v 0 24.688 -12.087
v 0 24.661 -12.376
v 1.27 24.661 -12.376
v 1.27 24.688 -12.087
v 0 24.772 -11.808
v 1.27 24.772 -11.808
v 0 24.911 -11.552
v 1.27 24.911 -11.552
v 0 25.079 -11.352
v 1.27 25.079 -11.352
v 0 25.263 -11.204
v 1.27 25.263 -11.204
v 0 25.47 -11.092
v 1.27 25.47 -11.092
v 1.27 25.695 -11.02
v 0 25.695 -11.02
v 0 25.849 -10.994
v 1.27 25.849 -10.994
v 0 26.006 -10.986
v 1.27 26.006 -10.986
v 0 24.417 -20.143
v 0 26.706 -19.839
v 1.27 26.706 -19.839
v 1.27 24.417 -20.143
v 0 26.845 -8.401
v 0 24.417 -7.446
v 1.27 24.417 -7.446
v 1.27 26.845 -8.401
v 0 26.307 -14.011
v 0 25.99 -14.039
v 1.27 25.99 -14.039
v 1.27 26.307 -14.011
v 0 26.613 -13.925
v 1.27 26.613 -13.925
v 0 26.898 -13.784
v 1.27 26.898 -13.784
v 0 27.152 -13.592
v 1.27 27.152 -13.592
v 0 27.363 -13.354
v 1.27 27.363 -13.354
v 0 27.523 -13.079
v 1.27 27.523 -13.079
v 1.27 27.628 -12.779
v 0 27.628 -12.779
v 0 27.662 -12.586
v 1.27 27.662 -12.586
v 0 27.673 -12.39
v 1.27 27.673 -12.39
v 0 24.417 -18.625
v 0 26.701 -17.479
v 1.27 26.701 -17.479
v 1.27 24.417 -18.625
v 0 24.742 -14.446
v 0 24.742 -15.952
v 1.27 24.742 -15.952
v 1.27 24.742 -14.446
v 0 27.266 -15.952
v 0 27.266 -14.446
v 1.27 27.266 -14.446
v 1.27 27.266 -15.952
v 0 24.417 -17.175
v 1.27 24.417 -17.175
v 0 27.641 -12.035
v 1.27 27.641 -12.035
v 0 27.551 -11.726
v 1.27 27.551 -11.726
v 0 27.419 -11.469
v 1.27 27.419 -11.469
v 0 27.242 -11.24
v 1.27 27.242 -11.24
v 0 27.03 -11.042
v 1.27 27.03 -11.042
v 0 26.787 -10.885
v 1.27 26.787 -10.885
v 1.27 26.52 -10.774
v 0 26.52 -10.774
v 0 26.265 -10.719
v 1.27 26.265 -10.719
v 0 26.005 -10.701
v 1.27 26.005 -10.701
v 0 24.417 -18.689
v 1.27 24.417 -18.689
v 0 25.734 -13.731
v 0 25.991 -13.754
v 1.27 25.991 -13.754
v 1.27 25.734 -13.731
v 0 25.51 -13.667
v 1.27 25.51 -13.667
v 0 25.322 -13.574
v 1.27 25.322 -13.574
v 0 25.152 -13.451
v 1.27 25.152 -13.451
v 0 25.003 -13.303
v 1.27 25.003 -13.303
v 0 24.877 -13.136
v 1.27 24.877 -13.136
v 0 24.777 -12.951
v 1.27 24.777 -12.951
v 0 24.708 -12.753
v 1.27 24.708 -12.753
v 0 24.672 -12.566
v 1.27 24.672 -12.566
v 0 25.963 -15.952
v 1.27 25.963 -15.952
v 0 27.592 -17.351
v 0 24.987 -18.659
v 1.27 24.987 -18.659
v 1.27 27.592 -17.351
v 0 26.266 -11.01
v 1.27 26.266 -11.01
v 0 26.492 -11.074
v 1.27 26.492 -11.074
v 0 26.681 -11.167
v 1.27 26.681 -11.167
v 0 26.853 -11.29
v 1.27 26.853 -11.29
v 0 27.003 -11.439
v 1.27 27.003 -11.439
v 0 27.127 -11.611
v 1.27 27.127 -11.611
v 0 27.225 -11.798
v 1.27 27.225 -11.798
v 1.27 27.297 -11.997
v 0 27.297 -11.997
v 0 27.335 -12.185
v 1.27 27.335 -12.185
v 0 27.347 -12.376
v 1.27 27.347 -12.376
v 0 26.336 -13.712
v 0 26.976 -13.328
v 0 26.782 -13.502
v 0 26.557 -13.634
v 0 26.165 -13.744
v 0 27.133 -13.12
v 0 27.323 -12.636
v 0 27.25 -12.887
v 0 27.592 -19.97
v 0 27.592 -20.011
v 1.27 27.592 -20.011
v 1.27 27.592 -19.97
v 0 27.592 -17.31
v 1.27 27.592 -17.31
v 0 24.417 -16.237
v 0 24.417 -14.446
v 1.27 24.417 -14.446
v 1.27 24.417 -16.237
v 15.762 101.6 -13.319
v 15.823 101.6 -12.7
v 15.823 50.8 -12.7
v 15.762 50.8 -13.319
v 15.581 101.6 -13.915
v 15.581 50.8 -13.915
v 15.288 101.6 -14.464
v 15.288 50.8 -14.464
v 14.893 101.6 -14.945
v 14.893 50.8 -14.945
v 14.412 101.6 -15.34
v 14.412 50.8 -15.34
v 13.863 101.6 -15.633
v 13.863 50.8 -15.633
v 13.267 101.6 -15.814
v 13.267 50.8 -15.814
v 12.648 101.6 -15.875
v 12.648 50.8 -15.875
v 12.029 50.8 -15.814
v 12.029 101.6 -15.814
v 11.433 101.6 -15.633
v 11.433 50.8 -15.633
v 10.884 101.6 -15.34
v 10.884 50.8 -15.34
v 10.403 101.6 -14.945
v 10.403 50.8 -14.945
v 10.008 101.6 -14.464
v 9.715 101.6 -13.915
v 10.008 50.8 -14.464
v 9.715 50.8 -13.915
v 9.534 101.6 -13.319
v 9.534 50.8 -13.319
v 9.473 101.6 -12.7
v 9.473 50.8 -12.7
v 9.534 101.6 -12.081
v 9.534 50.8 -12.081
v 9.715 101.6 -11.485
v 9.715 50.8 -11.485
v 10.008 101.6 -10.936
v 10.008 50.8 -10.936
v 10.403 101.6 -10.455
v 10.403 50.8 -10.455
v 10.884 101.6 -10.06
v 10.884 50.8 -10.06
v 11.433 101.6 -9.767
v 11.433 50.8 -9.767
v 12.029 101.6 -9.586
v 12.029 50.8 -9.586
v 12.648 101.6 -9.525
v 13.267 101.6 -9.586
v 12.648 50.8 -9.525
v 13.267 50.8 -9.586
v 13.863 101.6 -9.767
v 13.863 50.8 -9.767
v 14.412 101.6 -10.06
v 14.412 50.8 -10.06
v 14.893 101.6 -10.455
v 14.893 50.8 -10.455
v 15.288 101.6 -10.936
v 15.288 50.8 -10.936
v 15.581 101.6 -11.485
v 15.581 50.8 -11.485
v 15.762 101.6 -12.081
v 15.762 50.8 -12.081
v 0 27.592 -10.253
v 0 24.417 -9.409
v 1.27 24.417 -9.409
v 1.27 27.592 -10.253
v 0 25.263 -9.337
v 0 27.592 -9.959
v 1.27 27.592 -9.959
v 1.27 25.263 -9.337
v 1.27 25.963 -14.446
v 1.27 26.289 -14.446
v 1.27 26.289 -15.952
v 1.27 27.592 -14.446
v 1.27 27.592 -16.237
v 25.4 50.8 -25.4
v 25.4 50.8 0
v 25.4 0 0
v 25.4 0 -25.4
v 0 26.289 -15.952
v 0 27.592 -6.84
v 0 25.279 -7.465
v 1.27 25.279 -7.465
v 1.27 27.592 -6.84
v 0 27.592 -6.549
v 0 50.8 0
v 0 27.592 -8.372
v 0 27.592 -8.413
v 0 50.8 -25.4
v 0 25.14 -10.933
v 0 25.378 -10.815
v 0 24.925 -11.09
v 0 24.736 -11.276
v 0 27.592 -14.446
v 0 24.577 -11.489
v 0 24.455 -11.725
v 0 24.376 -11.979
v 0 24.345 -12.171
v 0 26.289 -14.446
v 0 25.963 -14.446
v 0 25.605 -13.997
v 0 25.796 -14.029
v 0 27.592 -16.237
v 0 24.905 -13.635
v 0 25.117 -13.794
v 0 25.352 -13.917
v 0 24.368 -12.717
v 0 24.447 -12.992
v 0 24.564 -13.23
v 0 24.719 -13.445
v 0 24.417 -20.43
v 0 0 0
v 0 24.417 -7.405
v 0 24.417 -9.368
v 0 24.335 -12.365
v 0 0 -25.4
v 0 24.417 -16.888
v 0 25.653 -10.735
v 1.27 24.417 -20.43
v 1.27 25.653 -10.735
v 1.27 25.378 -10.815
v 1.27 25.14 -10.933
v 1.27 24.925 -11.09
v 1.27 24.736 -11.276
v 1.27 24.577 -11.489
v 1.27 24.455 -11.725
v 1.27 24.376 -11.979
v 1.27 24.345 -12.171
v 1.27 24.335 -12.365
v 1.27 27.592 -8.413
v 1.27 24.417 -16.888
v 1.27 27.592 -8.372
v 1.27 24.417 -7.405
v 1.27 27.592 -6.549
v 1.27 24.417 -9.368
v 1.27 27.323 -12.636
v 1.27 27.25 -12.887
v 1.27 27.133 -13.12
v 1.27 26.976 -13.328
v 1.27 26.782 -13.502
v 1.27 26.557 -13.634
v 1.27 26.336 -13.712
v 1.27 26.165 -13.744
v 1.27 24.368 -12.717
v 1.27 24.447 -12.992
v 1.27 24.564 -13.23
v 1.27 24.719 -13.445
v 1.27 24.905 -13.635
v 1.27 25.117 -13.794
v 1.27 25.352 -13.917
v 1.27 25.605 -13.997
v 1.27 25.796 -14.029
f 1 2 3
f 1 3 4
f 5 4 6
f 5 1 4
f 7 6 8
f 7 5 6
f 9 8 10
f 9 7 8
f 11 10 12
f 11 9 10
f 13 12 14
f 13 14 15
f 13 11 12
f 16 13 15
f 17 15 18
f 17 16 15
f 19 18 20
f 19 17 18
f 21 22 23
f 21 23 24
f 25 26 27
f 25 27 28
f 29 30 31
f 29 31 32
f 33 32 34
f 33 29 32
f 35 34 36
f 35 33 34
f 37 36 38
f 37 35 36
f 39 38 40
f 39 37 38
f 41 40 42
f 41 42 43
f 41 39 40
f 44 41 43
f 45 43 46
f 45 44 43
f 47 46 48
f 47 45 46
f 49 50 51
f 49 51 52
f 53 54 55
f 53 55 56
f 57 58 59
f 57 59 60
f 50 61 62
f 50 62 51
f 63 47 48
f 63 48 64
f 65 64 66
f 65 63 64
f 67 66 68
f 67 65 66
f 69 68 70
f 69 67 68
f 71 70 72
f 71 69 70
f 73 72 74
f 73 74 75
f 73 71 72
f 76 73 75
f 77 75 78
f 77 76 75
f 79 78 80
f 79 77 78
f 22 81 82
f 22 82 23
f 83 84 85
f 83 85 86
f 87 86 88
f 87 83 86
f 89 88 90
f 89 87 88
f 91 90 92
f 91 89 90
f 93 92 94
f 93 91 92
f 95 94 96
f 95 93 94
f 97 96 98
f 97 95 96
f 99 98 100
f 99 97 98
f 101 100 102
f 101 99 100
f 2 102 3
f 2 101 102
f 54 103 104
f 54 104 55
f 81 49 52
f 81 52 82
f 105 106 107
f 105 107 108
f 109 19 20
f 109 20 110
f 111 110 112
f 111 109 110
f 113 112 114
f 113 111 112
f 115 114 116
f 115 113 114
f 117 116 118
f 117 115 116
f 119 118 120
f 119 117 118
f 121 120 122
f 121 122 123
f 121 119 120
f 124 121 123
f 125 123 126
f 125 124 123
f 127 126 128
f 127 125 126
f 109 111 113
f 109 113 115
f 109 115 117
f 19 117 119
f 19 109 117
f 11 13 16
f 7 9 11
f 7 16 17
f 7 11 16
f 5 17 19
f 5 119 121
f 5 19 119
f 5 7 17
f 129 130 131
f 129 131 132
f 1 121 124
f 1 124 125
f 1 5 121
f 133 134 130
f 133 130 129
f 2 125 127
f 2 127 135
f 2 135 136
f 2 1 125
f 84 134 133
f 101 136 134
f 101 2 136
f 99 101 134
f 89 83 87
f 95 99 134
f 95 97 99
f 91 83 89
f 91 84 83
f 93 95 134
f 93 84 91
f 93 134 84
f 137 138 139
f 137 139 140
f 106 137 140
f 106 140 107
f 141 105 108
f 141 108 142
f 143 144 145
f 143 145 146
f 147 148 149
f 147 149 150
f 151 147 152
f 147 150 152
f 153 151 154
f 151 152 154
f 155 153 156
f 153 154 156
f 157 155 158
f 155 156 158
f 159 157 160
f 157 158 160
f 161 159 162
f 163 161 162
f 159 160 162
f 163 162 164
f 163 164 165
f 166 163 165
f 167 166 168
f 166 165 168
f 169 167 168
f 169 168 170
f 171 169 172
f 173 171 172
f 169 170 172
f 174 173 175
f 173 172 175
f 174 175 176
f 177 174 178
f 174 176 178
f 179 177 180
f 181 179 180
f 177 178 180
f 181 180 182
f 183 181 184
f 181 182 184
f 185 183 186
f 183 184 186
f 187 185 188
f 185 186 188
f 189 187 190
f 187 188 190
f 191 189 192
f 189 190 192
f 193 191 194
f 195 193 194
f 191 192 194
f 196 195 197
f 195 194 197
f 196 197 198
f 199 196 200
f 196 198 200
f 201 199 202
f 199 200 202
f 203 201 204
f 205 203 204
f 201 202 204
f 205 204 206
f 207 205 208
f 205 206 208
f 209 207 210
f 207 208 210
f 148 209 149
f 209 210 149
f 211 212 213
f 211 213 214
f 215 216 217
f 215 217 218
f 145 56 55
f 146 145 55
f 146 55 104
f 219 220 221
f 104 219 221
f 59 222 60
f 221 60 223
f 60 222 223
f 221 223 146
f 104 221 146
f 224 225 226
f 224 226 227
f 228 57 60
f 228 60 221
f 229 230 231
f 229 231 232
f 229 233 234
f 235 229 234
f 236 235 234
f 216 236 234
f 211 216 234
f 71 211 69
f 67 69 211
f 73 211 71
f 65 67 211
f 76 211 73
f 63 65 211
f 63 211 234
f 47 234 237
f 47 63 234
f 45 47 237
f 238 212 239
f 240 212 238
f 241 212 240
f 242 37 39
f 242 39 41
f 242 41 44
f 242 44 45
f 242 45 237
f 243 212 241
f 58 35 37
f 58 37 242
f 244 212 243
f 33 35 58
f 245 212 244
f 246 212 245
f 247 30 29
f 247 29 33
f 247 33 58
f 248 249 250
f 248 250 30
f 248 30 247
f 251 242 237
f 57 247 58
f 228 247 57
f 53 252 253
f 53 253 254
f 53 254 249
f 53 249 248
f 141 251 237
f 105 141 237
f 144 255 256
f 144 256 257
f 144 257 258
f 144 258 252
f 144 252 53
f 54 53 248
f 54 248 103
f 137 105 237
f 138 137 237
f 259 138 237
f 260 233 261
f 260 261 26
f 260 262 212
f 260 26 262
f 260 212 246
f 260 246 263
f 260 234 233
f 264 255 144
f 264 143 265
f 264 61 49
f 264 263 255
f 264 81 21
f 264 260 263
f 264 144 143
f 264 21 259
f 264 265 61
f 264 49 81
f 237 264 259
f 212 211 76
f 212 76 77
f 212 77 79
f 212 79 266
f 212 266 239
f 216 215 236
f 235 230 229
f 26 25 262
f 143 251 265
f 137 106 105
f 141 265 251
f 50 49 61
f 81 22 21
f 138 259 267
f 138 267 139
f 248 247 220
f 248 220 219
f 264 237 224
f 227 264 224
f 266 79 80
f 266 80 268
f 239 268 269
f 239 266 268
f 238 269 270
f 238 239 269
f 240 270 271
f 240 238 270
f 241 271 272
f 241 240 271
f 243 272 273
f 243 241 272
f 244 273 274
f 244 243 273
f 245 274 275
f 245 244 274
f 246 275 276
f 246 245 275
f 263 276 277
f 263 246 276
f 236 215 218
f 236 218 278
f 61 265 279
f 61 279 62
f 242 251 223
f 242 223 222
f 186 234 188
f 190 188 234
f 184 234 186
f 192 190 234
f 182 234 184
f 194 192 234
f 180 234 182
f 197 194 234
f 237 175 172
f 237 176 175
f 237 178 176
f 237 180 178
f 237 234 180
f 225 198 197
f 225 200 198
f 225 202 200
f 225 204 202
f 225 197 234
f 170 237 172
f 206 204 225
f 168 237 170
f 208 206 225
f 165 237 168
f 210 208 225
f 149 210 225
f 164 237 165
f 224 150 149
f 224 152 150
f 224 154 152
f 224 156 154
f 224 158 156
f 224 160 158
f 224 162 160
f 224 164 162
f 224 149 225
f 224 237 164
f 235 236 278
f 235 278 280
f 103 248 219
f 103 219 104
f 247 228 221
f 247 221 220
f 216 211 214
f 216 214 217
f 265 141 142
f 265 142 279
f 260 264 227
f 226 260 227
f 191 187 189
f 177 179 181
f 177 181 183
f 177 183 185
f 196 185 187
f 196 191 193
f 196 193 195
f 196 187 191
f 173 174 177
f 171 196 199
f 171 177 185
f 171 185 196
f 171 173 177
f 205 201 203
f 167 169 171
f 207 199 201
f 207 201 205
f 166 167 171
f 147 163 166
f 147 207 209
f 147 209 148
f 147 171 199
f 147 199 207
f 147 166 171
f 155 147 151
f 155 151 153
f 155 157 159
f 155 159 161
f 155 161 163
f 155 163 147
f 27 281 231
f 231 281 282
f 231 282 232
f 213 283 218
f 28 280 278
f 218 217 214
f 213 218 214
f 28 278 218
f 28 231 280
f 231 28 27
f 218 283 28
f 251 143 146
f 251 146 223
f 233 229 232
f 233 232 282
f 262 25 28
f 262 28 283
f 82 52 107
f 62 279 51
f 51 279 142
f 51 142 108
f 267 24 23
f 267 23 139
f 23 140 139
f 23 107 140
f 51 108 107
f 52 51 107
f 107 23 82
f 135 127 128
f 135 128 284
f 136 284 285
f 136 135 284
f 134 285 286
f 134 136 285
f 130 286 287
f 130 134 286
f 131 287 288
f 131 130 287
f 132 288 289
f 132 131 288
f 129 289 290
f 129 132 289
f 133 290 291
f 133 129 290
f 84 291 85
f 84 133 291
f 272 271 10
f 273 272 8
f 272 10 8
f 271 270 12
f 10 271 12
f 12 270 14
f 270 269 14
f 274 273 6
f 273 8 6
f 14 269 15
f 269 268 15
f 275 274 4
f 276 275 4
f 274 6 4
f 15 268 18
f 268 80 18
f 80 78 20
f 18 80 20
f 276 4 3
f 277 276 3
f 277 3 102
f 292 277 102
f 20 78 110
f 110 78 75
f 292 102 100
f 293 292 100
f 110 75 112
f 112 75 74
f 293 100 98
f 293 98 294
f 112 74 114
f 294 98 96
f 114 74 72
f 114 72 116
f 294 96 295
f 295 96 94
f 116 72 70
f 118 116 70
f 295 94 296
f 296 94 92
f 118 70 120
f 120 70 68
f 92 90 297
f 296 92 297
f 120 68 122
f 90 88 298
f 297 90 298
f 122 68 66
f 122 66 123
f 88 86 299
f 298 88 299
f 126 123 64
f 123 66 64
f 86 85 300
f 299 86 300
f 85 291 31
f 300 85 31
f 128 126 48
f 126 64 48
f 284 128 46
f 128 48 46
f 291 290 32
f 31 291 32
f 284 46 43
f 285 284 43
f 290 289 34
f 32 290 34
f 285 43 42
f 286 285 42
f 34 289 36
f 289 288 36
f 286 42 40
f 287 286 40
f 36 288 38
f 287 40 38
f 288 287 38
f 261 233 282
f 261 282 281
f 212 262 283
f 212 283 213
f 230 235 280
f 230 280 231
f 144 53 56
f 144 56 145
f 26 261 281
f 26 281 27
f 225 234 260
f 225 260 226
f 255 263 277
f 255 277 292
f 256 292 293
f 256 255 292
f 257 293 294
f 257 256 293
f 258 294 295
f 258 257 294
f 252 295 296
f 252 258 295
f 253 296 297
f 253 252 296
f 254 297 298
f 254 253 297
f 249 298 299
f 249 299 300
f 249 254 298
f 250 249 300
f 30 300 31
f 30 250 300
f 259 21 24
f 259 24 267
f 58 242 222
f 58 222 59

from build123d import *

# Parameters (mm, degrees)
SKETCH1_W           = 25.4
SKETCH1_H           = 25.4
BOSS_EXTRUDE1_DEPTH = 50.8
SKETCH2_R           = 3.175
BOSS_EXTRUDE2_DEPTH = 50.8
CUT_EXTRUDE1_DEPTH  = 1.27


with BuildPart() as part:
    # Sketch1 → Boss-Extrude1 (new body)
    with BuildSketch(Plane(origin=(0, 0, 0), x_dir=(1, 0, 0), z_dir=(0, 1, 0))):
        with Locations((12.7, 12.7)):
            Rectangle(SKETCH1_W, SKETCH1_H)
    extrude(amount=BOSS_EXTRUDE1_DEPTH)

    # Sketch2 → Boss-Extrude2 (add)
    with BuildSketch(Plane(origin=(0, 50.8, 0), x_dir=(1, 0, 0), z_dir=(0, 1, 0))):
        with Locations((12.648058093, 12.7)):
            Circle(SKETCH2_R)
    extrude(amount=BOSS_EXTRUDE2_DEPTH)

    # Sketch3 → Cut-Extrude1 (cut)
    with BuildSketch(Plane.ZY):
        Polygon((-20.429638912, 24.416659376), (-20.010503295, 27.591659376), (-19.969798167, 27.591659376), (-18.658965835, 24.986531171), (-17.351313592, 27.591659376), (-17.309972446, 27.591659376), (-16.888292758, 24.416659376), (-17.174500691, 24.416659376), (-17.478517117, 26.701234697), (-18.624620883, 24.416659376), (-18.688858664, 24.416659376), (-19.839414553, 26.706322838), (-20.142794962, 24.416659376), align=None)
        Polygon((-16.237010707, 27.591659376), (-14.445985066, 27.591659376), (-14.445985066, 27.26601835), (-15.95207481, 27.26601835), (-15.95207481, 26.289095273), (-14.445985066, 26.289095273), (-14.445985066, 25.963454248), (-15.95207481, 25.963454248), (-15.95207481, 24.742300402), (-14.445985066, 24.742300402), (-14.445985066, 24.416659376), (-16.237010707, 24.416659376), align=None)
        with BuildLine():
            add(Edge.make_bspline(
                [(-12.390376092, 27.673069632), (-12.331585881, 27.671580576), (-12.216117058, 27.668655947), (-12.046413401, 27.646268474), (-11.884402136, 27.607537656), (-11.72876351, 27.555954808), (-11.581359167, 27.487144044), (-11.4410796, 27.403972516), (-11.308258579, 27.305568872), (-11.184686325, 27.192693787), (-11.071604663, 27.069881654), (-10.971976895, 26.93881955), (-10.888481386, 26.800299922), (-10.819914279, 26.654739026), (-10.766121969, 26.502466055), (-10.72900255, 26.34266921), (-10.705291514, 26.176383855), (-10.702519488, 26.062966628), (-10.701113271, 26.005431411)],
                knots=[0, 0, 0, 0, 0.000176342, 0.00034635, 0.000512345, 0.00067546, 0.000837376, 0.000999356, 0.00116396, 0.001332355, 0.001500709, 0.001664166, 0.001825381, 0.001984993, 0.002146116, 0.00230887, 0.002476442, 0.002648971, 0.002648971, 0.002648971, 0.002648971], degree=3))
            add(Edge.make_bspline(
                [(-10.701113271, 26.005431411), (-10.702519281, 25.948320013), (-10.70529069, 25.835746832), (-10.72902951, 25.670516708), (-10.76625956, 25.511684433), (-10.819414744, 25.359515162), (-10.887655, 25.213848372), (-10.971706477, 25.07506735), (-11.070713146, 24.943126598), (-11.183386504, 24.819471537), (-11.306214592, 24.706080975), (-11.437959191, 24.607275994), (-11.575657417, 24.522254824), (-11.721081224, 24.454415349), (-11.872301972, 24.400193678), (-12.030673079, 24.363225221), (-12.195452453, 24.339379117), (-12.307821149, 24.336640892), (-12.364935387, 24.33524912)],
                knots=[0, 0, 0, 0, 0.000171259, 0.000337571, 0.000499706, 0.000660019, 0.000820206, 0.000981421, 0.001145895, 0.001314289, 0.001482643, 0.001646609, 0.00180761, 0.001967222, 0.002127146, 0.002288662, 0.002454344, 0.002625603, 0.002625603, 0.002625603, 0.002625603], degree=3))
            add(Edge.make_bspline(
                [(-12.364935387, 24.33524912), (-12.422470305, 24.336654635), (-12.535886943, 24.339425279), (-12.702381254, 24.363175554), (-12.86229035, 24.400315165), (-13.01515694, 24.453391582), (-13.161066269, 24.521987213), (-13.300303701, 24.605629757), (-13.432310356, 24.704877663), (-13.555991798, 24.817514485), (-13.669157142, 24.940134393), (-13.767817433, 25.071519753), (-13.851478785, 25.209092917), (-13.919844094, 25.353235671), (-13.973968282, 25.503251194), (-14.010893367, 25.66014017), (-14.034783838, 25.82300815), (-14.037536877, 25.933899922), (-14.038933784, 25.990166988)],
                knots=[0, 0, 0, 0, 0.00017253, 0.000340102, 0.000503474, 0.000664388, 0.000824575, 0.000986335, 0.001150809, 0.001319204, 0.001487557, 0.001650632, 0.001811303, 0.001969765, 0.00212849, 0.002288769, 0.002452562, 0.00262128, 0.00262128, 0.00262128, 0.00262128], degree=3))
            add(Edge.make_bspline(
                [(-14.038933784, 25.990166988), (-14.038448793, 26.027933767), (-14.03748493, 26.102990879), (-14.025881038, 26.214448437), (-14.009042923, 26.324113534), (-13.984911188, 26.431674323), (-13.953350176, 26.536867502), (-13.916110122, 26.640418551), (-13.87062612, 26.741278072), (-13.819208675, 26.839923863), (-13.761821178, 26.934818177), (-13.698433891, 27.024516085), (-13.631273235, 27.109770275), (-13.557646442, 27.188371485), (-13.479980095, 27.262606302), (-13.397014281, 27.33133391), (-13.309255245, 27.395174044), (-13.216325372, 27.452705353), (-13.120514508, 27.504738282), (-13.021747717, 27.549389533), (-12.921366399, 27.587712746), (-12.818900396, 27.618774066), (-12.71462181, 27.643295984), (-12.608303049, 27.659994084), (-12.500028812, 27.671627572), (-12.427084258, 27.672586878), (-12.390376092, 27.673069632)],
                knots=[0, 0, 0, 0, 0.000113256, 0.000225083, 0.000335817, 0.000445988, 0.000555461, 0.000665116, 0.000775867, 0.0008871, 0.000998686, 0.001108262, 0.001216432, 0.001323994, 0.001431064, 0.001538557, 0.001646949, 0.001756368, 0.001866213, 0.001973803, 0.002081296, 0.002188332, 0.002294783, 0.002402377, 0.00251104, 0.002621117, 0.002621117, 0.002621117, 0.002621117], degree=3))
        make_face()
        with BuildLine():
            add(Edge.make_bspline(
                [(-12.376383704, 27.347428607), (-12.406514122, 27.347061313), (-12.466486908, 27.346330238), (-12.555645023, 27.336700268), (-12.643630563, 27.322975297), (-12.730461698, 27.303397775), (-12.815775118, 27.276724098), (-12.900366045, 27.24602556), (-12.983463101, 27.208632142), (-13.064791958, 27.166384046), (-13.143636348, 27.119621811), (-13.218033584, 27.067940279), (-13.288176268, 27.012551448), (-13.35389266, 26.953326052), (-13.414989795, 26.889962485), (-13.472670203, 26.823421347), (-13.524621895, 26.751800703), (-13.572233811, 26.677042691), (-13.614840352, 26.599244685), (-13.652727495, 26.519225738), (-13.683719131, 26.436333123), (-13.708994287, 26.351466137), (-13.729949115, 26.264759191), (-13.743224175, 26.175554528), (-13.752959958, 26.084300391), (-13.753649247, 26.022631138), (-13.753997887, 25.991439023)],
                knots=[0, 0, 0, 0, 9.035e-05, 0.000179837, 0.000268716, 0.000357433, 0.000446559, 0.000536708, 0.000627246, 0.000719699, 0.000811541, 0.000902048, 0.000991247, 0.001079509, 0.001167217, 0.001255174, 0.001343459, 0.001432386, 0.001520911, 0.0016094, 0.001697761, 0.001786094, 0.001874954, 0.00196509, 0.002056475, 0.002150004, 0.002150004, 0.002150004, 0.002150004], degree=3))
            add(Edge.make_bspline(
                [(-13.753997887, 25.991439023), (-13.752841405, 25.945571866), (-13.750566247, 25.855336978), (-13.730647594, 25.723104447), (-13.699966232, 25.596024359), (-13.654738478, 25.474792056), (-13.598177563, 25.358365456), (-13.52830317, 25.24777739), (-13.445518142, 25.142997968), (-13.351480514, 25.044758688), (-13.248680631, 24.955091423), (-13.139521654, 24.876384617), (-13.025173024, 24.809791033), (-12.905336548, 24.755539289), (-12.780651994, 24.712550026), (-12.65031593, 24.683087268), (-12.515196585, 24.663696677), (-12.423093776, 24.661834534), (-12.376383704, 24.660890145)],
                knots=[0, 0, 0, 0, 0.000137527, 0.000270558, 0.000400289, 0.000529072, 0.000657927, 0.000787976, 0.000920685, 0.001057889, 0.001195382, 0.001329354, 0.001461022, 0.001591668, 0.001723409, 0.001855936, 0.001992028, 0.002132069, 0.002132069, 0.002132069, 0.002132069], degree=3))
            add(Edge.make_bspline(
                [(-12.376383704, 24.660890145), (-12.344987942, 24.661321496), (-12.282720716, 24.662176993), (-12.190105492, 24.67079365), (-12.099158786, 24.684611131), (-12.01000816, 24.704505369), (-11.922754796, 24.729403906), (-11.83703451, 24.758983774), (-11.753760347, 24.795887437), (-11.67188178, 24.83666165), (-11.593508046, 24.883143793), (-11.518690956, 24.933071258), (-11.449316317, 24.988378506), (-11.383649088, 25.046723951), (-11.322301113, 25.109284013), (-11.265687249, 25.175977357), (-11.213998129, 25.247224953), (-11.166404292, 25.321869571), (-11.123947047, 25.399880457), (-11.086954578, 25.480189522), (-11.055570959, 25.562599014), (-11.030235815, 25.647227797), (-11.010382575, 25.733915138), (-10.996702934, 25.822777109), (-10.987133993, 25.913635941), (-10.986412744, 25.975089297), (-10.986049169, 26.006067429)],
                knots=[0, 0, 0, 0, 9.4165e-05, 0.000186757, 0.000278778, 0.000369977, 0.000460573, 0.00055089, 0.000641754, 0.000733627, 0.000825145, 0.000914934, 0.00100324, 0.001091077, 0.00117833, 0.001265874, 0.00135327, 0.001442197, 0.00153128, 0.001619501, 0.001707267, 0.0017956, 0.001884317, 0.001973824, 0.00206521, 0.002158103, 0.002158103, 0.002158103, 0.002158103], degree=3))
            add(Edge.make_bspline(
                [(-10.986049169, 26.006067429), (-10.986413035, 26.036833636), (-10.987134832, 26.097864076), (-10.996698363, 26.188089247), (-11.010397028, 26.276311803), (-11.030138913, 26.362185396), (-11.055584409, 26.445731915), (-11.086960059, 26.526872893), (-11.123958152, 26.605910613), (-11.166419899, 26.682649725), (-11.214149967, 26.756286809), (-11.266305459, 26.826683283), (-11.323786882, 26.892517127), (-11.384951919, 26.9554136), (-11.451328365, 27.014031257), (-11.522615546, 27.068389543), (-11.597948025, 27.119800299), (-11.677710589, 27.166178488), (-11.760028318, 27.209008542), (-11.84449598, 27.24570338), (-11.930156663, 27.276883803), (-12.016792537, 27.303478478), (-12.10513281, 27.32289862), (-12.194580569, 27.336712636), (-12.28501206, 27.346326886), (-12.345829838, 27.347060201), (-12.376383704, 27.347428607)],
                knots=[0, 0, 0, 0, 9.2258e-05, 0.00018301, 0.000271889, 0.000359986, 0.000447102, 0.00053368, 0.000620747, 0.000708715, 0.000796571, 0.000883833, 0.000971308, 0.00105856, 0.001146873, 0.001236684, 0.001327357, 0.001420293, 0.001513311, 0.001605595, 0.001696341, 0.001786684, 0.001877263, 0.001967398, 0.00205815, 0.002149772, 0.002149772, 0.002149772, 0.002149772], degree=3))
        make_face(mode=Mode.SUBTRACT)
        Polygon((-10.253356861, 27.591659376), (-9.958880699, 27.591659376), (-9.337491476, 25.263198839), (-8.413357863, 27.591659376), (-8.372016717, 27.591659376), (-7.465055579, 25.27909928), (-6.840486268, 27.591659376), (-6.549190194, 27.591659376), (-7.405269922, 24.416659376), (-7.44597505, 24.416659376), (-8.401273528, 26.84497468), (-9.368020323, 24.416659376), (-9.408725451, 24.416659376), align=None)
    extrude(amount=-CUT_EXTRUDE1_DEPTH, mode=Mode.SUBTRACT)


solid = part.part
